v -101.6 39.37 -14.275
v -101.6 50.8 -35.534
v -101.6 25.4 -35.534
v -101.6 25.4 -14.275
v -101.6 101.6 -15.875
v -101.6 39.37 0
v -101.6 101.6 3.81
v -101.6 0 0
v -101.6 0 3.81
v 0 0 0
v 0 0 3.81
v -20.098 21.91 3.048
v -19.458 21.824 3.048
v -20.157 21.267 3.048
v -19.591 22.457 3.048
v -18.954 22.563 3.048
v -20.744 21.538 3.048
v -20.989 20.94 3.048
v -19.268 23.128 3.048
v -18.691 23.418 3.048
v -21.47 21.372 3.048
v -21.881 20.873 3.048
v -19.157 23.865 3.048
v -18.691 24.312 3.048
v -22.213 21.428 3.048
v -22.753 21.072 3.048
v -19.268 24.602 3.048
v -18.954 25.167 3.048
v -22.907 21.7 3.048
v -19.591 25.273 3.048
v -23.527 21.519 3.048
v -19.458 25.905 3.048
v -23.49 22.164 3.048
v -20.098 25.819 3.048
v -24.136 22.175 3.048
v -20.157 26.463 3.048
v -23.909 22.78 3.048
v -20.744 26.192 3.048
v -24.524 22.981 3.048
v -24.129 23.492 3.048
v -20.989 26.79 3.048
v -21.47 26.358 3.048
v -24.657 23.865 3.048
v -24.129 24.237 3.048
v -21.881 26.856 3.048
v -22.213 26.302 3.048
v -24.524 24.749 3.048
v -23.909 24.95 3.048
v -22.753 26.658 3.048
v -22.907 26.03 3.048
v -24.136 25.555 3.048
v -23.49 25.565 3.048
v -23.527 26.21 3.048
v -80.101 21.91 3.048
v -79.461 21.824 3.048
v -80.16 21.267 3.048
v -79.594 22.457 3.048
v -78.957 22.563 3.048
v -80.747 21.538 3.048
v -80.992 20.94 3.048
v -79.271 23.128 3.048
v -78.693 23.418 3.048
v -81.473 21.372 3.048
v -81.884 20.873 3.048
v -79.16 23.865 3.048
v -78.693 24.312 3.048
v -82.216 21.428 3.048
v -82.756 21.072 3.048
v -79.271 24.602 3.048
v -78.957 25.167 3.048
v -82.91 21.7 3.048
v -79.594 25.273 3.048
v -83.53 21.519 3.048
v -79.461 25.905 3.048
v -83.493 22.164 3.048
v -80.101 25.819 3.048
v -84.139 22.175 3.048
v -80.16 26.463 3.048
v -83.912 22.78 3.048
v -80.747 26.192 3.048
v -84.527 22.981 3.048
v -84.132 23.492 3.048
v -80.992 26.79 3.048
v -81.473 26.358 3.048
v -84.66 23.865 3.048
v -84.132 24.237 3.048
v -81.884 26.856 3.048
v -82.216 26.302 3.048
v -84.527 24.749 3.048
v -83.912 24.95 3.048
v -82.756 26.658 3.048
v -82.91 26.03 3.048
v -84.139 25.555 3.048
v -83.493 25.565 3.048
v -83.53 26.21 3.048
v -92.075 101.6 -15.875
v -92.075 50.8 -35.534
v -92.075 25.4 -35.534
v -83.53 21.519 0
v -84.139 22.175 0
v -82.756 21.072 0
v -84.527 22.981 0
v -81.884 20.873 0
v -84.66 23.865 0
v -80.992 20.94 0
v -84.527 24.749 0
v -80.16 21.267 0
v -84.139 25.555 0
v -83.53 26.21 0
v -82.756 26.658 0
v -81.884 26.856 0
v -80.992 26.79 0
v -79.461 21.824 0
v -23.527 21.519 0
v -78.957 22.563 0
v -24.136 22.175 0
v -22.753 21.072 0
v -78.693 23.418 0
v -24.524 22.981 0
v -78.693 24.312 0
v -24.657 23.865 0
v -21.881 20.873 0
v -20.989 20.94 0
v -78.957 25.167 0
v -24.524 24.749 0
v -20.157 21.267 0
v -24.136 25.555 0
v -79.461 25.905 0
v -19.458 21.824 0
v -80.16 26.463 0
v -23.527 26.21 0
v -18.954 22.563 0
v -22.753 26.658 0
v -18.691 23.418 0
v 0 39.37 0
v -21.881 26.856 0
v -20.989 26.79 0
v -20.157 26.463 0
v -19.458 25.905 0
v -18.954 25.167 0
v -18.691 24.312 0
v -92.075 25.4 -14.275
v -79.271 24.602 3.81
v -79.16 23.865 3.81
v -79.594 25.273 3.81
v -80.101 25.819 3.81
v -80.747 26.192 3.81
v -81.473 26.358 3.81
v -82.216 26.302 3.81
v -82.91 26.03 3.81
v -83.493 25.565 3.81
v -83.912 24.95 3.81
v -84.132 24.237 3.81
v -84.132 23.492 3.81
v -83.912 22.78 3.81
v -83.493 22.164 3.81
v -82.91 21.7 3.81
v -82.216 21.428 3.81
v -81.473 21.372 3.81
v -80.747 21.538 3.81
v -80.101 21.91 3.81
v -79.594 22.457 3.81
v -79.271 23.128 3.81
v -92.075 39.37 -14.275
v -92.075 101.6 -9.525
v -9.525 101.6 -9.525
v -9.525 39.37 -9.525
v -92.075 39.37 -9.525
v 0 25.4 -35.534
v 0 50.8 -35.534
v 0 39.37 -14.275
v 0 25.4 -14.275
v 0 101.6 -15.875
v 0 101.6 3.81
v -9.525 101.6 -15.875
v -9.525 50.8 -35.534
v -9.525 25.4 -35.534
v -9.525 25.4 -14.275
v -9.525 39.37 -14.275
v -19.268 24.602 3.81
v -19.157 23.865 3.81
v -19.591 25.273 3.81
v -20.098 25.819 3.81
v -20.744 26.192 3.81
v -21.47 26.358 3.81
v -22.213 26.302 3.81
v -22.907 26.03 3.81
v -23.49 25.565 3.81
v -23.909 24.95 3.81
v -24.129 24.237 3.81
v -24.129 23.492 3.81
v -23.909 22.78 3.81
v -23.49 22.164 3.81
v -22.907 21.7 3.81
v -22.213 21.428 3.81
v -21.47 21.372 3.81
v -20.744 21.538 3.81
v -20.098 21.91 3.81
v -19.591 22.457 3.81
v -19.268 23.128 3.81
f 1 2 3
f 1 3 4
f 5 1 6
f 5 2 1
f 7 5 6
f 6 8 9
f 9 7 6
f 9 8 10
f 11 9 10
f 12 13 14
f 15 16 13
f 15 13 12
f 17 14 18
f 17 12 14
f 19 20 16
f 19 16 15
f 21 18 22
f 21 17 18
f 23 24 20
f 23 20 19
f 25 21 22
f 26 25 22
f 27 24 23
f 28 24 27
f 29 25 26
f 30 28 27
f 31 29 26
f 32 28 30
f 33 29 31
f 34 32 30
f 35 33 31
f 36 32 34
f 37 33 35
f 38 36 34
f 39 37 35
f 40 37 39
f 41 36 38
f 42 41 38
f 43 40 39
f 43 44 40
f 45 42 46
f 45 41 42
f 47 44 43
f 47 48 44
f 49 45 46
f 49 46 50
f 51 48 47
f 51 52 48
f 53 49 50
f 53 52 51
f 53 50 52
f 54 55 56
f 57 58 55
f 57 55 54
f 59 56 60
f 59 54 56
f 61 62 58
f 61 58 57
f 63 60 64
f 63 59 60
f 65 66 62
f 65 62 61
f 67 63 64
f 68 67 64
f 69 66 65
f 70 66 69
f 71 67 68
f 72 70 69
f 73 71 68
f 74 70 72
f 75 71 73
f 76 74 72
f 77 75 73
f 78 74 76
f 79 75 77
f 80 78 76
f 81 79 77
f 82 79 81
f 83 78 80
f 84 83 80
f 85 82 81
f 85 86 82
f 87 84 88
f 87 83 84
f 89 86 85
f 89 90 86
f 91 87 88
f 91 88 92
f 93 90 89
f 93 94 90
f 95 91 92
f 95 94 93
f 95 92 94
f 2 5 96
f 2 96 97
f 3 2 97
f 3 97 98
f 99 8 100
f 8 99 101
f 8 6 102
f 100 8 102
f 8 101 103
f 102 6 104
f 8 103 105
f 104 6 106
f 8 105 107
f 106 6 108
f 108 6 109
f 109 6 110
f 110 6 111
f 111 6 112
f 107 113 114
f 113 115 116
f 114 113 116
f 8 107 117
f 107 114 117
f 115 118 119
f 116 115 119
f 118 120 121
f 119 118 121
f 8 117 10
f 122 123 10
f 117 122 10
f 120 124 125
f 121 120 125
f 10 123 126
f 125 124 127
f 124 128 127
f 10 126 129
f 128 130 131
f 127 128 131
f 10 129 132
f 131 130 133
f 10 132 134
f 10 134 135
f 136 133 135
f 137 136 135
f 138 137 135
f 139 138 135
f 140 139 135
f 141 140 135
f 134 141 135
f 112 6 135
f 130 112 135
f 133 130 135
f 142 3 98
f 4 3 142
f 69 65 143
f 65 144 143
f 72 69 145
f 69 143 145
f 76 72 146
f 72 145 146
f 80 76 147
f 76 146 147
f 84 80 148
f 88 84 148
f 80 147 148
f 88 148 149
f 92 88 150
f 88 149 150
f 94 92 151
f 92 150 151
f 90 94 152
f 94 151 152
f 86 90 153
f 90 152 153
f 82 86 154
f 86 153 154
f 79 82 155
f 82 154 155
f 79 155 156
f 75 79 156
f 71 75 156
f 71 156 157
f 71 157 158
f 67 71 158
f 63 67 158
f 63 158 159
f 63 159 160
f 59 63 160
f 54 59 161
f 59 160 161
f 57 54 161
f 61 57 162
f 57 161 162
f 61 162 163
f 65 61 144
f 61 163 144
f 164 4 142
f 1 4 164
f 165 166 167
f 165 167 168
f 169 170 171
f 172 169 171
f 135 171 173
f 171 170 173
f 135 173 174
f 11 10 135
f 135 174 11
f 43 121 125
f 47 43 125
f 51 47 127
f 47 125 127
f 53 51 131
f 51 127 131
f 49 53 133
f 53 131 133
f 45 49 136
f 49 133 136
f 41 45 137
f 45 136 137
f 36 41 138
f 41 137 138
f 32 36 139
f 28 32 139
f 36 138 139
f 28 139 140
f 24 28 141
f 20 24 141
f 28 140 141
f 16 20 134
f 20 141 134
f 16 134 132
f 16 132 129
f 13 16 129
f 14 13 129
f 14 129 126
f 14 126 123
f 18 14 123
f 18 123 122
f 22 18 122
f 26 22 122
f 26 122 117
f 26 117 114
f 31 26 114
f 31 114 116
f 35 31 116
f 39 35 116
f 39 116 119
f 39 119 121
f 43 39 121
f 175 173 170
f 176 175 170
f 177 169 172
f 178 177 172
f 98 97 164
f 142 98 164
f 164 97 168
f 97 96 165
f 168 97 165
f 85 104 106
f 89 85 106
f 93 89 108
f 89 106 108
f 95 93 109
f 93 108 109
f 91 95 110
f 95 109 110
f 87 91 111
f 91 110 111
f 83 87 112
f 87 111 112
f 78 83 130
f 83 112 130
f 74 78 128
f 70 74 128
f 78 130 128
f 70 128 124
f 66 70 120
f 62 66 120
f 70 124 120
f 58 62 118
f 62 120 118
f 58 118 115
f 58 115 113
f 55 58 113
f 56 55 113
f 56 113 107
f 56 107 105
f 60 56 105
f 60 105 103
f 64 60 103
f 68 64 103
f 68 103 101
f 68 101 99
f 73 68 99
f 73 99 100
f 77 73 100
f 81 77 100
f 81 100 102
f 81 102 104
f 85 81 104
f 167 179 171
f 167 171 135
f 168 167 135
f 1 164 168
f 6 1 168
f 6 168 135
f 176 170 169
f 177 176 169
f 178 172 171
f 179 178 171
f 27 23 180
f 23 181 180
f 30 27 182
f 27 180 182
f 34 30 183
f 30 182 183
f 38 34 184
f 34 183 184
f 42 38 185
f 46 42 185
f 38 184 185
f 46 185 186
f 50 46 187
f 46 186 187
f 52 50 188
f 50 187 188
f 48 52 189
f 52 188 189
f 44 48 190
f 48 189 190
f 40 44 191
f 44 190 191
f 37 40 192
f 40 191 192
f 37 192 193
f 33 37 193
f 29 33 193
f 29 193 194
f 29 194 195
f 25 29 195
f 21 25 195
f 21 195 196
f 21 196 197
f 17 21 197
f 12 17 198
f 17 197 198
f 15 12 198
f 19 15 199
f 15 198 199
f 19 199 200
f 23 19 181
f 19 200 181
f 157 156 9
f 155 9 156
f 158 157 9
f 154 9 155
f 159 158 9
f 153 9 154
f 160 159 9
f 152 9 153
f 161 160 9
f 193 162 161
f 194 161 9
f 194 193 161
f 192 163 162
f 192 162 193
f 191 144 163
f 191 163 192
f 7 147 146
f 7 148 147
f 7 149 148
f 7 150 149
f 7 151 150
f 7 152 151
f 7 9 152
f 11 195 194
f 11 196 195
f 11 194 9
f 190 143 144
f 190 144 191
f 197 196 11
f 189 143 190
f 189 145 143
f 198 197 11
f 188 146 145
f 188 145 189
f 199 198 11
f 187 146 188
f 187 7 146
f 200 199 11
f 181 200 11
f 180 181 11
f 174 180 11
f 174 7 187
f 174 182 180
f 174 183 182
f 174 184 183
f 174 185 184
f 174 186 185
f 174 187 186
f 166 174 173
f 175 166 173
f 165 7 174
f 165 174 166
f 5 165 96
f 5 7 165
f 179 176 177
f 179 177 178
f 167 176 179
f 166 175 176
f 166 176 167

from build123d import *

# Parameters (mm, degrees)
SKETCH1_W                       = 101.6
SKETCH1_H                       = 101.6
BOSS_EXTRUDE1_DEPTH             = 3.81
M6X1_0_TAPPED_HOLE1_D           = 5
M6X1_0_TAPPED_HOLE1_CBORE_D     = 6
M6X1_0_TAPPED_HOLE1_CBORE_DEPTH = 3.048
SKETCH4_W                       = 101.6
SKETCH4_H                       = 62.23
BOSS_EXTRUDE2_DEPTH             = 9.525
BOSS_EXTRUDE3_DEPTH             = 9.525
BOSS_EXTRUDE4_DEPTH             = 9.525


with BuildPart() as part:
    # Sketch1 → Boss-Extrude1 (new body)
    with BuildSketch(Plane.XY):
        with Locations((-50.8, 50.8)):
            Rectangle(SKETCH1_W, SKETCH1_H)
    extrude(amount=BOSS_EXTRUDE1_DEPTH)

    # M6x1.0 Tapped Hole1 (through all)
    with Locations(Plane(origin=(-50.8, -38.1, 0), x_dir=(-1, 0, 0), z_dir=(0, 0, -1))):
        with Locations((-29.14300736, 61.964884424), (30.859893074, 61.964884424)):
            CounterBoreHole(M6X1_0_TAPPED_HOLE1_D / 2, M6X1_0_TAPPED_HOLE1_CBORE_D / 2, M6X1_0_TAPPED_HOLE1_CBORE_DEPTH)

    # Sketch4 → Boss-Extrude2 (add)
    with BuildSketch(Plane(origin=(0, 0, 0), x_dir=(-1, 0, 0), z_dir=(0, 0, -1))):
        with Locations((50.8, 70.485)):
            Rectangle(SKETCH4_W, SKETCH4_H)
    extrude(amount=BOSS_EXTRUDE2_DEPTH)

    # Sketch5 → Boss-Extrude3 (add)
    with BuildSketch(Plane(origin=(0, 0, 0), x_dir=(0, 0, -1), z_dir=(1, 0, 0))):
        Polygon((9.525, 101.6), (15.875, 101.6), (35.534233385, 50.8), (35.534233385, 25.4), (14.2748, 25.4), (14.2748, 39.37), (9.525, 39.37), align=None)
    extrude(amount=-BOSS_EXTRUDE3_DEPTH)

    # Sketch6 → Boss-Extrude4 (add)
    with BuildSketch(Plane.ZY.offset(101.6)):
        Polygon((-9.525, 39.37), (-9.525, 101.6), (-15.875, 101.6), (-35.534233385, 50.8), (-35.534233385, 25.4), (-14.2748, 25.4), (-14.2748, 39.37), align=None)
    extrude(amount=-BOSS_EXTRUDE4_DEPTH)


solid = part.part
